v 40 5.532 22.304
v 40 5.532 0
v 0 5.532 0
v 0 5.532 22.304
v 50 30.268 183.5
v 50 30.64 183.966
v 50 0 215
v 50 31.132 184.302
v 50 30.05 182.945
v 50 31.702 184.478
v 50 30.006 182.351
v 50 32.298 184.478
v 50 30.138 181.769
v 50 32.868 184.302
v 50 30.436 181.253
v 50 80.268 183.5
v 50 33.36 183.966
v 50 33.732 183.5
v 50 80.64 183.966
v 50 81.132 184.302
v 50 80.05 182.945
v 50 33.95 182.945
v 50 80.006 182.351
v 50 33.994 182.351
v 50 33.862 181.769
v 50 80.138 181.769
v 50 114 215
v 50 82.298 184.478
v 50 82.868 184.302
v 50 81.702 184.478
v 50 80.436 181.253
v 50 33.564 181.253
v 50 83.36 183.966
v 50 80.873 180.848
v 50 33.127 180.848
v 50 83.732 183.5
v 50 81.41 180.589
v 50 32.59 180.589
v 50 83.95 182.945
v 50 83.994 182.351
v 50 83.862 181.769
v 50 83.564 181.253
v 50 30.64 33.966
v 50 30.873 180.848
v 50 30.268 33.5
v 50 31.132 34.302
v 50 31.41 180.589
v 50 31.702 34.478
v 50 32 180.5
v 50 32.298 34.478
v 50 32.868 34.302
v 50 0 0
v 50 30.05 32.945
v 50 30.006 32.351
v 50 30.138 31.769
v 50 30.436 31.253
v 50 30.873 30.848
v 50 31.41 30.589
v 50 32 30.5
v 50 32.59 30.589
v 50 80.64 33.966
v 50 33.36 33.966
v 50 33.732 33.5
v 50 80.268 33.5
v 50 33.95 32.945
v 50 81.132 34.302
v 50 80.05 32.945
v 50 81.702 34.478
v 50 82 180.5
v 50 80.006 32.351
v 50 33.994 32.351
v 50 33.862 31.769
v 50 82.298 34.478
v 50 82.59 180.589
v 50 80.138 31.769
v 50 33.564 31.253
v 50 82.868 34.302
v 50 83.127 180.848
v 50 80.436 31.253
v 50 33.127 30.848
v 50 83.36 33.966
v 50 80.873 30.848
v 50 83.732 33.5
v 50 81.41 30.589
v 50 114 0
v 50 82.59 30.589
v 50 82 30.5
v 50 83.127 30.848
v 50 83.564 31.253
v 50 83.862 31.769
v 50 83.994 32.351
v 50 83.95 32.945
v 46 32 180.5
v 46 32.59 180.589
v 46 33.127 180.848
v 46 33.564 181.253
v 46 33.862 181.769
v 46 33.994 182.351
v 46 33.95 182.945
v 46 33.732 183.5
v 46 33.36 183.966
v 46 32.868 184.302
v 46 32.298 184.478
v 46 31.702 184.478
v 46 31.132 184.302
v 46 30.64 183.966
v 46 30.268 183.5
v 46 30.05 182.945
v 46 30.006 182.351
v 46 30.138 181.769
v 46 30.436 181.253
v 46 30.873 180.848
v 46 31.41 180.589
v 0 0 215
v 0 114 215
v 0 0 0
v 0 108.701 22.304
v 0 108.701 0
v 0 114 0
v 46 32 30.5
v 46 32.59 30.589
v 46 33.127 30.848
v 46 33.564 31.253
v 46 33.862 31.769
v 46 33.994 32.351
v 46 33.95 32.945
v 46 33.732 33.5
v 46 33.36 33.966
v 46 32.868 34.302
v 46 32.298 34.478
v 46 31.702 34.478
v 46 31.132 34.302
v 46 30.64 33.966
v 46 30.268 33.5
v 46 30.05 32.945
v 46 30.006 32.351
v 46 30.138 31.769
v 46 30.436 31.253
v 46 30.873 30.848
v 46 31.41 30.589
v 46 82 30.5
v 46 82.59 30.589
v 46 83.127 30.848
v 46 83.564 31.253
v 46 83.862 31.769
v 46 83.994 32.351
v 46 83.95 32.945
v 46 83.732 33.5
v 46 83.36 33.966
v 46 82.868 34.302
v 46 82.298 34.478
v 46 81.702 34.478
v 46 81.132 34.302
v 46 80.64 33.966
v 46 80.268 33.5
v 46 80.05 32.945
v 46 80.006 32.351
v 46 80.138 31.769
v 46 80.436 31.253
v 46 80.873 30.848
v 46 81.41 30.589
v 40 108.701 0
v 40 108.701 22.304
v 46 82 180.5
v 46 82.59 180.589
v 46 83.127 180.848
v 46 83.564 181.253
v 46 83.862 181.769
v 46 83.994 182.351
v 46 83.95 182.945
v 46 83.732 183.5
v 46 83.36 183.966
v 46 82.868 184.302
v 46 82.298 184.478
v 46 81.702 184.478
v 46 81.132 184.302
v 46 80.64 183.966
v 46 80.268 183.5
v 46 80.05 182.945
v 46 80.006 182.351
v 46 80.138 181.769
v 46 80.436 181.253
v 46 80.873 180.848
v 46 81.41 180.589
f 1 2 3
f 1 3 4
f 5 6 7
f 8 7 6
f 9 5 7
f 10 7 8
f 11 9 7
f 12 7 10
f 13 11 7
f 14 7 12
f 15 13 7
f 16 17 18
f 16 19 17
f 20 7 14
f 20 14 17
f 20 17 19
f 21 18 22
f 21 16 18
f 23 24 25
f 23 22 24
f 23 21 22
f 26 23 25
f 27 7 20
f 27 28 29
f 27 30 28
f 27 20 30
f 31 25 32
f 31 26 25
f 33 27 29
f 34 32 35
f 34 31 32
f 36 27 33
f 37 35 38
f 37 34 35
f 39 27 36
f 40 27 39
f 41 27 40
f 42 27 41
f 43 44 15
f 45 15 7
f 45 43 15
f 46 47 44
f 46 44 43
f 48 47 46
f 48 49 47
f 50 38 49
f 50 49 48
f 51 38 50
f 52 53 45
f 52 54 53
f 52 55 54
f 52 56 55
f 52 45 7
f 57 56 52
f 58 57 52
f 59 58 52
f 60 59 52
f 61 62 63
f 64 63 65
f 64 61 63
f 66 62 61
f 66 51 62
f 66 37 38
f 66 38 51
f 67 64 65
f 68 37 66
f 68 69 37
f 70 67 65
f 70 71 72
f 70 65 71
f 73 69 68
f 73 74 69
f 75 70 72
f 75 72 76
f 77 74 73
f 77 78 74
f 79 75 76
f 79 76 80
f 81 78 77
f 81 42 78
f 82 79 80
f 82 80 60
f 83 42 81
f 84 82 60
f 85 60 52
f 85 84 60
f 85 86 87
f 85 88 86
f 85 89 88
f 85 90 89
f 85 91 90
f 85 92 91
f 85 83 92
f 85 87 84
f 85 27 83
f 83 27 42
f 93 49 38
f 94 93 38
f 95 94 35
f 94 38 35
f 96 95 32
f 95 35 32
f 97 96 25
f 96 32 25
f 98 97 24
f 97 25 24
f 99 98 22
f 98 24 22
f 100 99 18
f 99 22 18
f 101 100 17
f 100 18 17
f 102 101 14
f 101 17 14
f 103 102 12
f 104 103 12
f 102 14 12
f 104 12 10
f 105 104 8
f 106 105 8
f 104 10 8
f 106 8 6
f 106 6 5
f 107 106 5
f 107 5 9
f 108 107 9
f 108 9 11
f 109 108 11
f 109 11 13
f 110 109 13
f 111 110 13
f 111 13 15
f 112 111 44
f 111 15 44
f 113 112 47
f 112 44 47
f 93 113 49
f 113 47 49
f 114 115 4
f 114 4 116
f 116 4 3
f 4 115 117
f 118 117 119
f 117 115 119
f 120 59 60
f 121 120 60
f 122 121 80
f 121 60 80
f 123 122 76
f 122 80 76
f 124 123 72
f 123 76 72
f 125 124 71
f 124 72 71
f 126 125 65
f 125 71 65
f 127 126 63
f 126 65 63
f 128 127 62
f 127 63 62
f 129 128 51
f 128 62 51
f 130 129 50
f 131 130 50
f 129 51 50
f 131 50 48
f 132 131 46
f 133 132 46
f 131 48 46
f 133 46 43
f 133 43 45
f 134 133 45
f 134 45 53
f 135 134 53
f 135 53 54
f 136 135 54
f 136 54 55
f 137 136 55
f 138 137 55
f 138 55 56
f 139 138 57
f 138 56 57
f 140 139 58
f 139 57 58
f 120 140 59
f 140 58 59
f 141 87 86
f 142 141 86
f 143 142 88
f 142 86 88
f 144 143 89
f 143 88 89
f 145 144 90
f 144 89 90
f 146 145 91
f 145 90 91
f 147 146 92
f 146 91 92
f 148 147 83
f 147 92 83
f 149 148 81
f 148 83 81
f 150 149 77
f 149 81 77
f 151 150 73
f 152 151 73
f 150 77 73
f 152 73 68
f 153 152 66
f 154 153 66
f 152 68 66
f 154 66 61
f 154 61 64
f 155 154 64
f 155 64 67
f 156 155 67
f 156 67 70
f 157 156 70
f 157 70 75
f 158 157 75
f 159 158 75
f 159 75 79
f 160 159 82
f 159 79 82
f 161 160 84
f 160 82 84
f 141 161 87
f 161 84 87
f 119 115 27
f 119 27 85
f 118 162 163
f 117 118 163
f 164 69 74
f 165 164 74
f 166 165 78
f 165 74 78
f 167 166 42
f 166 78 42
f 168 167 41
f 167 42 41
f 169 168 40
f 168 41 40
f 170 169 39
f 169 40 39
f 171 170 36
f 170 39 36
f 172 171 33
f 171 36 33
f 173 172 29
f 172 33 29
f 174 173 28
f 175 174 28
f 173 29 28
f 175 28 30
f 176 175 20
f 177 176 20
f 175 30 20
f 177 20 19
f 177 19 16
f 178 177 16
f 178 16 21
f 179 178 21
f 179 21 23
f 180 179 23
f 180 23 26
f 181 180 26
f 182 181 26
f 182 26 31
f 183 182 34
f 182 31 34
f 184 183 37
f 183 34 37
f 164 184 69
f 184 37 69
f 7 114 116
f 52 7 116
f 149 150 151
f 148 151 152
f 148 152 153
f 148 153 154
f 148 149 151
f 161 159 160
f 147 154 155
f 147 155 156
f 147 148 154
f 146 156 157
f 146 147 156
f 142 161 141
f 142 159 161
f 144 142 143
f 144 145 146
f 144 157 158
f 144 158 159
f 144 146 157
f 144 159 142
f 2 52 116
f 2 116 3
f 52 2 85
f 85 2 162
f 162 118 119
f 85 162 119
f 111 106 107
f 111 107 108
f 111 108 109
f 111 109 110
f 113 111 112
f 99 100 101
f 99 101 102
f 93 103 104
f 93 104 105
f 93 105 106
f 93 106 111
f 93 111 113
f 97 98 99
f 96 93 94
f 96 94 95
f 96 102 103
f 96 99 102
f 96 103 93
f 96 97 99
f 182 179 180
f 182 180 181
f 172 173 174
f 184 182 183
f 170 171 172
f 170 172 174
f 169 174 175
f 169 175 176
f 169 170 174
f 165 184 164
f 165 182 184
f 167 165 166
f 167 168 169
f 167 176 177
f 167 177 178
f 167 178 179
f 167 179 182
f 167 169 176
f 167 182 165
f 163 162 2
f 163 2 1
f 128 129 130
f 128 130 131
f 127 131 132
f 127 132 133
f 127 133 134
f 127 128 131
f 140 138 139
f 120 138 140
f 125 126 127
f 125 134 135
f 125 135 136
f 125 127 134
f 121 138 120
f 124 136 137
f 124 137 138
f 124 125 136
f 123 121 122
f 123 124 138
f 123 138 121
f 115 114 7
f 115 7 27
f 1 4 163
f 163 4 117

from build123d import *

# Parameters (mm, degrees)
SKETCH_1_W          = 215
SKETCH_1_H          = 114
EXTRUDE_1_DEPTH     = 50
SKETCH_2_W          = 22.304316617
SKETCH_2_H          = 103.168471384
CUT_EXTRUDE_1_DEPTH = 40
SKETCH_3_R          = 2
CUT_EXTRUDE_2_DEPTH = 4


with BuildPart() as part:
    # 草图1 → 凸台-拉伸1 (new body)
    with BuildSketch(Plane(origin=(0, 0, 0), x_dir=(0, 0, -1), z_dir=(1, 0, 0))):
        with Locations((-107.5, 57)):
            Rectangle(SKETCH_1_W, SKETCH_1_H)
    extrude(amount=EXTRUDE_1_DEPTH)

    # 草图2 → 切除-拉伸1 (cut)
    with BuildSketch(Plane.ZY):
        with Locations((11.152158309, 57.116706416)):
            Rectangle(SKETCH_2_W, SKETCH_2_H)
    extrude(amount=-CUT_EXTRUDE_1_DEPTH, mode=Mode.SUBTRACT)

    # 草图3 → 切除-拉伸2 (cut)
    with BuildSketch(Plane(origin=(50, 0, 0), x_dir=(0, 0, -1), z_dir=(1, 0, 0))):
        with Locations((-182.5, 82)):
            Circle(SKETCH_3_R)
        with Locations((-32.5, 82)):
            Circle(SKETCH_3_R)
        with Locations((-32.5, 32)):
            Circle(SKETCH_3_R)
        with Locations((-182.5, 32)):
            Circle(SKETCH_3_R)
    extrude(amount=-CUT_EXTRUDE_2_DEPTH, mode=Mode.SUBTRACT)


solid = part.part
